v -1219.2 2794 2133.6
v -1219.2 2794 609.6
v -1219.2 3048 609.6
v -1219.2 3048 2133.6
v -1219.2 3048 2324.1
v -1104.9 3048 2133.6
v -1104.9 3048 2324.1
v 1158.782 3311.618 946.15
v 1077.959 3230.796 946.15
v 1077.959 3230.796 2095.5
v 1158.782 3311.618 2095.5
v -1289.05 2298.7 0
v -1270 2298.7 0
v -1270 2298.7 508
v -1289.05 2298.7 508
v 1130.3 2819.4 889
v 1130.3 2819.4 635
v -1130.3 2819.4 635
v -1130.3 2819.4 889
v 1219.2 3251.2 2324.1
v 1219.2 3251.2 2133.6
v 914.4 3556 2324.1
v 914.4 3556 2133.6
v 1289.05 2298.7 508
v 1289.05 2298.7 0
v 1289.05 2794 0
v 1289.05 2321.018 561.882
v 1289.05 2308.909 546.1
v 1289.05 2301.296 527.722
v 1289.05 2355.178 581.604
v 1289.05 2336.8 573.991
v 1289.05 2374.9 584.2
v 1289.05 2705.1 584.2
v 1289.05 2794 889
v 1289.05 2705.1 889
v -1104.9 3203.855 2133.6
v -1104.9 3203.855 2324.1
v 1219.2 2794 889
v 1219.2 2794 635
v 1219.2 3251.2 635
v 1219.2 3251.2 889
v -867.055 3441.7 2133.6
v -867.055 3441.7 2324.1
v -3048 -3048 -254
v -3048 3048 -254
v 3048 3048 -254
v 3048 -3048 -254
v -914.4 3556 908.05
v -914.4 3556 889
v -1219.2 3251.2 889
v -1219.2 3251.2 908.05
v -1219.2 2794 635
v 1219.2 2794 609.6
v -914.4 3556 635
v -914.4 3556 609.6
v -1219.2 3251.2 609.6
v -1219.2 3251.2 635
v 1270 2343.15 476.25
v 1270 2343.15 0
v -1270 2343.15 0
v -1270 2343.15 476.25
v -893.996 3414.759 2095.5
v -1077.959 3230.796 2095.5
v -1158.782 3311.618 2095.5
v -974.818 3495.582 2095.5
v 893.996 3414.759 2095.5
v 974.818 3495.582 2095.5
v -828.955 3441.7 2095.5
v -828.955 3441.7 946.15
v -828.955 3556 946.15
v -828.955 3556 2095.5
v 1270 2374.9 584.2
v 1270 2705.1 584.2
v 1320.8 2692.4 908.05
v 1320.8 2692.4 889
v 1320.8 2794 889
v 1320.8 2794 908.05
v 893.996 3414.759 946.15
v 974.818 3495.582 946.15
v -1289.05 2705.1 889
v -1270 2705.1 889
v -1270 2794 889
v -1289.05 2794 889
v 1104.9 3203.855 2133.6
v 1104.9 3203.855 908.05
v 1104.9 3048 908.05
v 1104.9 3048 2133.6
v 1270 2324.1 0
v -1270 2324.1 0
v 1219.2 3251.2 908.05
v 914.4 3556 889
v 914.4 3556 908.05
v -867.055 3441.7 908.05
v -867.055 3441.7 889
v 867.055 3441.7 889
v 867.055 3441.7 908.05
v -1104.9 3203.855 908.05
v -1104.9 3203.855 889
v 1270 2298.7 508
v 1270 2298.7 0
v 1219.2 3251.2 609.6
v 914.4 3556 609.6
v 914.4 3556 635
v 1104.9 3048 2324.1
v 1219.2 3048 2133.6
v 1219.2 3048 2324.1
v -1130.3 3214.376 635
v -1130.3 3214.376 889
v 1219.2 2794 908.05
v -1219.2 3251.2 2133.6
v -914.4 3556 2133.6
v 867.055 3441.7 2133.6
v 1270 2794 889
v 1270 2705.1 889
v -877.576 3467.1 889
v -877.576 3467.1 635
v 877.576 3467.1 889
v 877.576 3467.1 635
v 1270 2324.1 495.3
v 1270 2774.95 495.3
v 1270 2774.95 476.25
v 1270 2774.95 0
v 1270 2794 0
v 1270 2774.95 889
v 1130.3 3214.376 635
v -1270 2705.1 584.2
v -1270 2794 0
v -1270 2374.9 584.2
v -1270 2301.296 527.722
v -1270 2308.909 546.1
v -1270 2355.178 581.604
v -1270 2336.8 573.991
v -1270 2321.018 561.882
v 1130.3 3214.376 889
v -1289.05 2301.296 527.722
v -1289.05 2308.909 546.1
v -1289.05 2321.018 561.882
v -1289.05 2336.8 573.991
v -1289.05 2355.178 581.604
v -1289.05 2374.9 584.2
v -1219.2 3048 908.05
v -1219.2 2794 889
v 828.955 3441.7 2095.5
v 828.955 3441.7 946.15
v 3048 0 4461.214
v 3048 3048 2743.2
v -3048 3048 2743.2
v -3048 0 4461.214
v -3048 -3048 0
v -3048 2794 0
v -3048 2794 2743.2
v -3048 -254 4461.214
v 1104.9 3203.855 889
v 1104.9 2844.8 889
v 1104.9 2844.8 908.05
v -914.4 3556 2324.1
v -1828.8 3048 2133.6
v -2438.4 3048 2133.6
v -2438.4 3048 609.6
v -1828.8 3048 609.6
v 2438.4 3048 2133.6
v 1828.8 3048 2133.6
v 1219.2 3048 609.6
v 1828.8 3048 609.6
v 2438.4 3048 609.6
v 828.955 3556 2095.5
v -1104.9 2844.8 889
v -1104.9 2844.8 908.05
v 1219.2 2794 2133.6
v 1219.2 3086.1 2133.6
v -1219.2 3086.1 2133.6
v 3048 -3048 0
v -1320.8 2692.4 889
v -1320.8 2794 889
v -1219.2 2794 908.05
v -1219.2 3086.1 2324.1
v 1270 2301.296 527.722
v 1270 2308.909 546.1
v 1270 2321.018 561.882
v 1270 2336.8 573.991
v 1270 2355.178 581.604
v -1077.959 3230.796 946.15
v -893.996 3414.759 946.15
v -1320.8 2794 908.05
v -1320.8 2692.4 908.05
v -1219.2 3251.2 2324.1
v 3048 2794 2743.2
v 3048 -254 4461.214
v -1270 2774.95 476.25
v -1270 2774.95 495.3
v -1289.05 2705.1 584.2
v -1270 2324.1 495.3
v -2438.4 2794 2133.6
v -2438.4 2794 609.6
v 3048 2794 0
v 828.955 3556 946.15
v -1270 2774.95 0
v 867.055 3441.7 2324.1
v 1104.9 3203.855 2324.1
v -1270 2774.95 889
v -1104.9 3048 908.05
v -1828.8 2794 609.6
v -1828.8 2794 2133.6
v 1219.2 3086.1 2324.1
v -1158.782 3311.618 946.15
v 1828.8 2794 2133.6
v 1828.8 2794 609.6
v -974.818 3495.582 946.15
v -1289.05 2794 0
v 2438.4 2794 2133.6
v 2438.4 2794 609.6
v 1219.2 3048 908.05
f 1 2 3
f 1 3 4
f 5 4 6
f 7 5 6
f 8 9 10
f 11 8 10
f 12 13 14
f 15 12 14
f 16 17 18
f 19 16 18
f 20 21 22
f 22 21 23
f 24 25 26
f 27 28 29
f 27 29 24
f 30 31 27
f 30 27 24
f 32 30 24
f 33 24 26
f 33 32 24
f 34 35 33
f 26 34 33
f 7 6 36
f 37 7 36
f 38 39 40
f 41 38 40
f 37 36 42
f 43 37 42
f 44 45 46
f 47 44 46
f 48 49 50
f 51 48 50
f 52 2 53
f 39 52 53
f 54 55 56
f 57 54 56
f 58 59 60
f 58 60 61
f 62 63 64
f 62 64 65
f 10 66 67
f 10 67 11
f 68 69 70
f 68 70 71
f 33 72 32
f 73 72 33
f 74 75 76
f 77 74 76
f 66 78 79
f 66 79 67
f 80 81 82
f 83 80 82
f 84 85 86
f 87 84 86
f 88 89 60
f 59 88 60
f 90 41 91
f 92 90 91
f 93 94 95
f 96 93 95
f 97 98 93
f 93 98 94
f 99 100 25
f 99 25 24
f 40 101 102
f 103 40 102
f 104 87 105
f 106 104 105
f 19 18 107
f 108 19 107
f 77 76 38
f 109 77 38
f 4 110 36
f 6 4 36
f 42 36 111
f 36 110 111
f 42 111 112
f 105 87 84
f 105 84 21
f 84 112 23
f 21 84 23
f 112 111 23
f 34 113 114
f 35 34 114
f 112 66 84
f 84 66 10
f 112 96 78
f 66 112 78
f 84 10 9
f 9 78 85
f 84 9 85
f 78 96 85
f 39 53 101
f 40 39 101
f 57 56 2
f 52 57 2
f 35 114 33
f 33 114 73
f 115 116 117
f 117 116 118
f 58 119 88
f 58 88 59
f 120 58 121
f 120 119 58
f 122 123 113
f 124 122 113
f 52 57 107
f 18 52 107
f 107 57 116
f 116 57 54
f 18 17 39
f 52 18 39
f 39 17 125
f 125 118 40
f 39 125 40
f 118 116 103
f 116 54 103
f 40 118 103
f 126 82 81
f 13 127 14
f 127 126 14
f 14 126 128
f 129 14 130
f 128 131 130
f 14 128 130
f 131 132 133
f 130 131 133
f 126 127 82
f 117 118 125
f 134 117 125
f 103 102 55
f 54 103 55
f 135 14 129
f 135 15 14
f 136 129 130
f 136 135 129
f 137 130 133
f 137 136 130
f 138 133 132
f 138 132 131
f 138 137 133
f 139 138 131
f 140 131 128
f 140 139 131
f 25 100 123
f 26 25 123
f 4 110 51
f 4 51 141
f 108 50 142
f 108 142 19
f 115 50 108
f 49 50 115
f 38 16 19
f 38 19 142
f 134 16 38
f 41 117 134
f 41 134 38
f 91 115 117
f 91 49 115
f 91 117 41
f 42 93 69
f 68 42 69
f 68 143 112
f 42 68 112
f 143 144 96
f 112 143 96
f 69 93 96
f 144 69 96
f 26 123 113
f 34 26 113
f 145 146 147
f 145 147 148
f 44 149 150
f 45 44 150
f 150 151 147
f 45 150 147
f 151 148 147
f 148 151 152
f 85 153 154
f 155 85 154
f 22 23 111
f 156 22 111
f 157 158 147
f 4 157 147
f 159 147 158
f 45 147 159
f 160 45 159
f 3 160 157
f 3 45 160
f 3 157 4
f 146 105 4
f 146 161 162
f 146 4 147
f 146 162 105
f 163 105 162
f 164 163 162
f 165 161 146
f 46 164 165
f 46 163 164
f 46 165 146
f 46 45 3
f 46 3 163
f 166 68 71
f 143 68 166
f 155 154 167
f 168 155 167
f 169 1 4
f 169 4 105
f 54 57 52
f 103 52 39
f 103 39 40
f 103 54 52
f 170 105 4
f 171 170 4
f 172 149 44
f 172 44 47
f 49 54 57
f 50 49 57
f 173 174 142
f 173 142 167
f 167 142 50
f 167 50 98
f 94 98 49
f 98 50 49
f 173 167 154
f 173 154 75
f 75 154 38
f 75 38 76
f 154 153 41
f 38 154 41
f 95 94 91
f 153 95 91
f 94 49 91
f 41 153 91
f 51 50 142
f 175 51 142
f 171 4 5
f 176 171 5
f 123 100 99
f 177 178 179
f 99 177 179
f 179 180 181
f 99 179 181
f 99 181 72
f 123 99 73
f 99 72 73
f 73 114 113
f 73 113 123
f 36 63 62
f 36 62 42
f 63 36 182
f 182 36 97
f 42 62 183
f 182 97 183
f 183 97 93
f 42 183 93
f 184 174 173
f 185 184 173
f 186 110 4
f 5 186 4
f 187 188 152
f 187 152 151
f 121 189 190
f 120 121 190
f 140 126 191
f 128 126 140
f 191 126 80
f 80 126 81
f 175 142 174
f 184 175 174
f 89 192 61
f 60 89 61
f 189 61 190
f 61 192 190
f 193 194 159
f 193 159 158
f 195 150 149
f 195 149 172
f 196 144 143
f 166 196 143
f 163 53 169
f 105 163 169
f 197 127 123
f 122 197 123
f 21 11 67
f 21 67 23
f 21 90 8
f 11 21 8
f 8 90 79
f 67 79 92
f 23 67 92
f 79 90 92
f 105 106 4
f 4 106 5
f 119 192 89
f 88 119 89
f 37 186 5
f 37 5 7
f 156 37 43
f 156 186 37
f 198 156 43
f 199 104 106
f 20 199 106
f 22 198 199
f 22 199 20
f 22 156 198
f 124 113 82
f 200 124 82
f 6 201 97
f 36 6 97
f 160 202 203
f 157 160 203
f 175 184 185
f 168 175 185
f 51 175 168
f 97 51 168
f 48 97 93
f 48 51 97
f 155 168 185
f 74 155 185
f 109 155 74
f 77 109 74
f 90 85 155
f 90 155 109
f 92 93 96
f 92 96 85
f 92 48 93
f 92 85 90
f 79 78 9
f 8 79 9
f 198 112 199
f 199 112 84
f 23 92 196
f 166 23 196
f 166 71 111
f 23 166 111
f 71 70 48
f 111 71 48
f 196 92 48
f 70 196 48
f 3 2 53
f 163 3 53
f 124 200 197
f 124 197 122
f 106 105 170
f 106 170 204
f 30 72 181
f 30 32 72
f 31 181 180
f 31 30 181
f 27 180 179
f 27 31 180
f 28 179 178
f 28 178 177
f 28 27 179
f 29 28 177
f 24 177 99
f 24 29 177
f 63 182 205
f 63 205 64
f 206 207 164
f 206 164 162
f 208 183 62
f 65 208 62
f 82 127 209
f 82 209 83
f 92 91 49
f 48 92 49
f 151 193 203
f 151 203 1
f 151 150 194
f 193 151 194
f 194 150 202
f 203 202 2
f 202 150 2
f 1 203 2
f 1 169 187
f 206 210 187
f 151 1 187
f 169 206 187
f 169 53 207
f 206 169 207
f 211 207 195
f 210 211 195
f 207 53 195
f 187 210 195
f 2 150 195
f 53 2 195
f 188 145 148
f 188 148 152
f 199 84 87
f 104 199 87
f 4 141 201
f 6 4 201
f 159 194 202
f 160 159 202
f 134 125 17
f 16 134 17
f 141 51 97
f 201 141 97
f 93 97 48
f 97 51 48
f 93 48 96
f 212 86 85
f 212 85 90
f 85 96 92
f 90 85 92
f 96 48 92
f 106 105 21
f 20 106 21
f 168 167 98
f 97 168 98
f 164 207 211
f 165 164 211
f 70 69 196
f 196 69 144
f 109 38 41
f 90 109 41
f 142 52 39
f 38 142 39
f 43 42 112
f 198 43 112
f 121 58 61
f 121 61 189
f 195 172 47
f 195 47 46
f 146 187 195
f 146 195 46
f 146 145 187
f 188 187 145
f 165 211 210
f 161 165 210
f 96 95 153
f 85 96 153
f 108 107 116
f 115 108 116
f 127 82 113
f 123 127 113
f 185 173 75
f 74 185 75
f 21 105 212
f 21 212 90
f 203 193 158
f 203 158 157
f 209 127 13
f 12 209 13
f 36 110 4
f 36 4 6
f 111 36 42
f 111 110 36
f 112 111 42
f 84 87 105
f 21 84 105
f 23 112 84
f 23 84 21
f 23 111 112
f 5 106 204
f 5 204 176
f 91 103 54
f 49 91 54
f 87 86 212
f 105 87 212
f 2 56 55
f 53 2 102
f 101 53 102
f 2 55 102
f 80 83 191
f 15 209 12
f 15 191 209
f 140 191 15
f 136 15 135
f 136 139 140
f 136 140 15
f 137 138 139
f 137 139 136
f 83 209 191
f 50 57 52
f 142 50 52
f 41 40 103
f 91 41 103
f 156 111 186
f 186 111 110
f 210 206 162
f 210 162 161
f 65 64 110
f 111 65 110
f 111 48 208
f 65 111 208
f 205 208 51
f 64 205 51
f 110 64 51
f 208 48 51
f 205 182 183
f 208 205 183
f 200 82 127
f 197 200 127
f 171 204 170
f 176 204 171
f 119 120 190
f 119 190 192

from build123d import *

# Parameters (mm, degrees)
F0_W      = 6096
F0_H      = 6096
F1_DEPTH  = 254
F2_W      = 6096
F2_H      = 254
F3_DEPTH  = 2743.2
F5_DEPTH  = 6096
F6_W      = 609.6
F6_H      = 1524
F7_DEPTH  = 304.8
F8_W      = 2438.4
F8_H      = 1524
F9_DEPTH  = 304.8
F11_DEPTH = 25.4
F13_DEPTH = 254
F15_DEPTH = 19.05
F16_W     = 2438.4
F16_H     = 190.5
F17_DEPTH = 38.1
F18_W     = 2438.4
F18_H     = 279.4
F19_DEPTH = 19.05
F20_W     = 19.05
F20_H     = 889
F20_W_2   = 406.4
F20_H_2   = 584.2
F21_DEPTH = 19.05
F22_W     = 406.4
F22_H     = 584.2
F23_DEPTH = 19.05
F24_W     = 19.05
F24_H     = 476.25
F25_DEPTH = 2540
F26_R     = 76.2
F26_2_R   = 76.2
F28_DEPTH = 1225.55
F29_W     = 1657.9107796415
F29_H     = 1149.35
F30_DEPTH = 127
F31_W     = 260.1630734528
F31_H     = 1149.35
F32_DEPTH = 127
F33_W     = 260.1630734528
F33_H     = 1149.35
F34_DEPTH = 127
F35_DEPTH = 190.5


with BuildPart() as f1:
    # F0 (on Top) → F1 (new body)
    with BuildSketch(Plane.XY):
        Rectangle(F0_W, F0_H)
    extrude(amount=-F1_DEPTH)

    # F2 (on face) → F3 (join)
    with BuildSketch(Plane.XY):
        with Locations((0, 2921)):
            Rectangle(F2_W, F2_H)
    extrude(amount=F3_DEPTH)

    # F4 (on face) → F5 (join)
    with BuildSketch(Plane.YZ.offset(3048)):
        Polygon((2794, 2743.2), (3048, 2743.2), (0, 4461.2135887146), (-254, 4461.2135887146), align=None)
    extrude(amount=-F5_DEPTH)

    # F6 (on face) → F7 (cut)
    with BuildSketch(Plane.XZ.offset(-2794)):
        with Locations((-2133.6, 1371.6)):
            Rectangle(F6_W, F6_H)
        with Locations((2133.6, 1371.6)):
            Rectangle(F6_W, F6_H)
    extrude(amount=-F7_DEPTH, mode=Mode.SUBTRACT)

    # F8 (on face) → F9 (cut)
    with BuildSketch(Plane.XZ.offset(-2794)):
        with Locations((0, 1371.6)):
            Rectangle(F8_W, F8_H)
    extrude(amount=-F9_DEPTH, mode=Mode.SUBTRACT)


with BuildPart() as f11:
    # F10 (on face) → F11 (new body)
    with BuildSketch(Plane.XY.offset(609.6)):
        Polygon((-1219.2, 3251.2), (-1219.2, 3048), (1219.2, 3048), (1219.2, 3251.2), (914.4, 3556), (-914.4, 3556), align=None)
        Polygon((-1219.2, 3048), (-1219.2, 2794), (0, 2794), (1219.2, 2794), (1219.2, 3048), align=None)
    extrude(amount=F11_DEPTH)


with BuildPart() as f13:
    # F12 (on face) → F13 (new body)
    with BuildSketch(Plane.XY.offset(635)):
        Polygon((-1219.2, 3251.2), (-1219.2, 2794), (1219.2, 2794), (1219.2, 3251.2), (914.4, 3556), (-914.4, 3556), align=None)
        Polygon((-1130.3, 3214.376414305), (-877.576414305, 3467.1), (877.576414305, 3467.1), (1130.3, 3214.376414305), (1130.3, 3149.6), (1130.3, 3124.2), (1130.3, 2819.4), (-1130.3, 2819.4), (-1130.3, 3124.2), (-1130.3, 3149.6), align=None, mode=Mode.SUBTRACT)
    extrude(amount=F13_DEPTH)


with BuildPart() as f15:
    # F14 (on face) → F15 (new body)
    with BuildSketch(Plane.XY.offset(889)):
        Polygon((-1219.2, 2794), (1219.2, 2794), (1219.2, 3251.2), (914.4, 3556), (-914.4, 3556), (-1219.2, 3251.2), align=None)
        Polygon((-1104.9, 2844.8), (-1104.9, 3203.8553898208), (-867.0553898208, 3441.7), (867.0553898208, 3441.7), (1104.9, 3203.8553898208), (1104.9, 2844.8), align=None, mode=Mode.SUBTRACT)
        Polygon((1320.8, 2794), (1219.2, 2794), (-1219.2, 2794), (-1320.8, 2794), (-1320.8, 2692.4), (1320.8, 2692.4), align=None)
    extrude(amount=F15_DEPTH)


with BuildPart() as f17:
    # F16 (on face) → F17 (new body)
    with BuildSketch(Plane(origin=(0, 3048, 0), x_dir=(-1, 0, 0), z_dir=(0, 1, 0))):
        with Locations((0, 2228.85)):
            Rectangle(F16_W, F16_H)
    extrude(amount=F17_DEPTH)


with BuildPart() as f19:
    # F18 (on face) → F19 (new body)
    with BuildSketch(Plane.XZ.offset(-2794)):
        with Locations((0, 749.3)):
            Rectangle(F18_W, F18_H)
        Polygon((-1219.2, 889), (-1270, 889), (-1270, 0), (1270, 0), (1270, 889), (1219.2, 889), (1219.2, 609.6), (-1219.2, 609.6), align=None)
    extrude(amount=F19_DEPTH)


with BuildPart() as f21:
    # F20 (on face) → F21 (new body)
    with BuildSketch(Plane(origin=(-1270, 0, 0), x_dir=(0, -1, 0), z_dir=(-1, 0, 0))):
        with Locations((-2784.475, 444.5)):
            Rectangle(F20_W, F20_H)
        with Locations((-2501.9, 292.1)):
            Rectangle(F20_W_2, F20_H_2)
        Polygon((-2705.1, 889), (-2774.95, 889), (-2774.95, 0), (-2705.1, 0), (-2705.1, 584.2), align=None)
    extrude(amount=F21_DEPTH)

    # F26#2
    f26_2_edges = [f21.edges().sort_by_distance(p)[0] for p in [
        (-1279.525, 2298.7, 584.2),
    ]]
    fillet(f26_2_edges, radius=F26_2_R)


with BuildPart() as f23:
    # F22 (on face) → F23 (new body)
    with BuildSketch(Plane.YZ.offset(1270)):
        Polygon((2794, 0), (2794, 889), (2705.1, 889), (2705.1, 584.2), (2705.1, 0), align=None)
        with Locations((2501.9, 292.1)):
            Rectangle(F22_W, F22_H)
    extrude(amount=F23_DEPTH)

    # F26
    f26_edges = [f23.edges().sort_by_distance(p)[0] for p in [
        (1279.525, 2298.7, 584.2),
    ]]
    fillet(f26_edges, radius=F26_R)


with BuildPart() as f25:
    # F24 (on face) → F25 (new body, through all)
    with BuildSketch(Plane.YZ.offset(-1270)):
        Polygon((2774.95, 476.25), (2774.95, 495.3), (2324.1, 495.3), (2324.1, 476.25), (2343.15, 476.25), align=None)
        with Locations((2333.625, 238.125)):
            Rectangle(F24_W, F24_H)
    extrude(amount=F25_DEPTH)


with BuildPart() as f28:
    # F27 (on face) → F28 (new body, through all)
    with BuildSketch(Plane.XY.offset(908.05)):
        Polygon((-1219.2, 3251.2), (-1219.2, 3048), (-1104.9, 3048), (-1104.9, 3203.8553898208), (-867.0553898208, 3441.7), (867.0553898208, 3441.7), (1104.9, 3203.8553898208), (1104.9, 3048), (1219.2, 3048), (1219.2, 3251.2), (914.4, 3556), (-914.4, 3556), align=None)
    extrude(amount=F28_DEPTH)

    # F29 (on face) → F30 (cut)
    with BuildSketch(Plane.XZ.offset(-3441.7)):
        with Locations((0, 1520.825)):
            Rectangle(F29_W, F29_H)
    extrude(amount=-F30_DEPTH, mode=Mode.SUBTRACT)

    # F31 (on face) → F32 (cut)
    with BuildSketch(Plane(origin=(-2154.3776949104, 2154.3776949104, 0), x_dir=(0.7071067812, 0.7071067812, 0), z_dir=(0.7071067812, -0.7071067812, 0))):
        with Locations((1652.3671262767, 1520.825)):
            Rectangle(F31_W, F31_H)
    extrude(amount=-F32_DEPTH, mode=Mode.SUBTRACT)

    # F33 (on face) → F34 (cut)
    with BuildSketch(Plane(origin=(2154.3776949104, 2154.3776949104, 0), x_dir=(0.7071067812, -0.7071067812, 0), z_dir=(-0.7071067812, -0.7071067812, 0))):
        with Locations((-1652.3671262767, 1520.825)):
            Rectangle(F33_W, F33_H)
    extrude(amount=-F34_DEPTH, mode=Mode.SUBTRACT)


with BuildPart() as f35:
    # F35 (new, through all): a face of the model
    f35_faces = [f28.part.faces().sort_by_distance(p)[0] for p in [
        (1194.2924538342, 3149.6, 2133.6),
    ]]
    extrude(f35_faces, amount=F35_DEPTH)


solid = Compound([f1.part, f11.part, f13.part, f15.part, f17.part, f19.part, f21.part, f23.part, f25.part, f28.part, f35.part])
